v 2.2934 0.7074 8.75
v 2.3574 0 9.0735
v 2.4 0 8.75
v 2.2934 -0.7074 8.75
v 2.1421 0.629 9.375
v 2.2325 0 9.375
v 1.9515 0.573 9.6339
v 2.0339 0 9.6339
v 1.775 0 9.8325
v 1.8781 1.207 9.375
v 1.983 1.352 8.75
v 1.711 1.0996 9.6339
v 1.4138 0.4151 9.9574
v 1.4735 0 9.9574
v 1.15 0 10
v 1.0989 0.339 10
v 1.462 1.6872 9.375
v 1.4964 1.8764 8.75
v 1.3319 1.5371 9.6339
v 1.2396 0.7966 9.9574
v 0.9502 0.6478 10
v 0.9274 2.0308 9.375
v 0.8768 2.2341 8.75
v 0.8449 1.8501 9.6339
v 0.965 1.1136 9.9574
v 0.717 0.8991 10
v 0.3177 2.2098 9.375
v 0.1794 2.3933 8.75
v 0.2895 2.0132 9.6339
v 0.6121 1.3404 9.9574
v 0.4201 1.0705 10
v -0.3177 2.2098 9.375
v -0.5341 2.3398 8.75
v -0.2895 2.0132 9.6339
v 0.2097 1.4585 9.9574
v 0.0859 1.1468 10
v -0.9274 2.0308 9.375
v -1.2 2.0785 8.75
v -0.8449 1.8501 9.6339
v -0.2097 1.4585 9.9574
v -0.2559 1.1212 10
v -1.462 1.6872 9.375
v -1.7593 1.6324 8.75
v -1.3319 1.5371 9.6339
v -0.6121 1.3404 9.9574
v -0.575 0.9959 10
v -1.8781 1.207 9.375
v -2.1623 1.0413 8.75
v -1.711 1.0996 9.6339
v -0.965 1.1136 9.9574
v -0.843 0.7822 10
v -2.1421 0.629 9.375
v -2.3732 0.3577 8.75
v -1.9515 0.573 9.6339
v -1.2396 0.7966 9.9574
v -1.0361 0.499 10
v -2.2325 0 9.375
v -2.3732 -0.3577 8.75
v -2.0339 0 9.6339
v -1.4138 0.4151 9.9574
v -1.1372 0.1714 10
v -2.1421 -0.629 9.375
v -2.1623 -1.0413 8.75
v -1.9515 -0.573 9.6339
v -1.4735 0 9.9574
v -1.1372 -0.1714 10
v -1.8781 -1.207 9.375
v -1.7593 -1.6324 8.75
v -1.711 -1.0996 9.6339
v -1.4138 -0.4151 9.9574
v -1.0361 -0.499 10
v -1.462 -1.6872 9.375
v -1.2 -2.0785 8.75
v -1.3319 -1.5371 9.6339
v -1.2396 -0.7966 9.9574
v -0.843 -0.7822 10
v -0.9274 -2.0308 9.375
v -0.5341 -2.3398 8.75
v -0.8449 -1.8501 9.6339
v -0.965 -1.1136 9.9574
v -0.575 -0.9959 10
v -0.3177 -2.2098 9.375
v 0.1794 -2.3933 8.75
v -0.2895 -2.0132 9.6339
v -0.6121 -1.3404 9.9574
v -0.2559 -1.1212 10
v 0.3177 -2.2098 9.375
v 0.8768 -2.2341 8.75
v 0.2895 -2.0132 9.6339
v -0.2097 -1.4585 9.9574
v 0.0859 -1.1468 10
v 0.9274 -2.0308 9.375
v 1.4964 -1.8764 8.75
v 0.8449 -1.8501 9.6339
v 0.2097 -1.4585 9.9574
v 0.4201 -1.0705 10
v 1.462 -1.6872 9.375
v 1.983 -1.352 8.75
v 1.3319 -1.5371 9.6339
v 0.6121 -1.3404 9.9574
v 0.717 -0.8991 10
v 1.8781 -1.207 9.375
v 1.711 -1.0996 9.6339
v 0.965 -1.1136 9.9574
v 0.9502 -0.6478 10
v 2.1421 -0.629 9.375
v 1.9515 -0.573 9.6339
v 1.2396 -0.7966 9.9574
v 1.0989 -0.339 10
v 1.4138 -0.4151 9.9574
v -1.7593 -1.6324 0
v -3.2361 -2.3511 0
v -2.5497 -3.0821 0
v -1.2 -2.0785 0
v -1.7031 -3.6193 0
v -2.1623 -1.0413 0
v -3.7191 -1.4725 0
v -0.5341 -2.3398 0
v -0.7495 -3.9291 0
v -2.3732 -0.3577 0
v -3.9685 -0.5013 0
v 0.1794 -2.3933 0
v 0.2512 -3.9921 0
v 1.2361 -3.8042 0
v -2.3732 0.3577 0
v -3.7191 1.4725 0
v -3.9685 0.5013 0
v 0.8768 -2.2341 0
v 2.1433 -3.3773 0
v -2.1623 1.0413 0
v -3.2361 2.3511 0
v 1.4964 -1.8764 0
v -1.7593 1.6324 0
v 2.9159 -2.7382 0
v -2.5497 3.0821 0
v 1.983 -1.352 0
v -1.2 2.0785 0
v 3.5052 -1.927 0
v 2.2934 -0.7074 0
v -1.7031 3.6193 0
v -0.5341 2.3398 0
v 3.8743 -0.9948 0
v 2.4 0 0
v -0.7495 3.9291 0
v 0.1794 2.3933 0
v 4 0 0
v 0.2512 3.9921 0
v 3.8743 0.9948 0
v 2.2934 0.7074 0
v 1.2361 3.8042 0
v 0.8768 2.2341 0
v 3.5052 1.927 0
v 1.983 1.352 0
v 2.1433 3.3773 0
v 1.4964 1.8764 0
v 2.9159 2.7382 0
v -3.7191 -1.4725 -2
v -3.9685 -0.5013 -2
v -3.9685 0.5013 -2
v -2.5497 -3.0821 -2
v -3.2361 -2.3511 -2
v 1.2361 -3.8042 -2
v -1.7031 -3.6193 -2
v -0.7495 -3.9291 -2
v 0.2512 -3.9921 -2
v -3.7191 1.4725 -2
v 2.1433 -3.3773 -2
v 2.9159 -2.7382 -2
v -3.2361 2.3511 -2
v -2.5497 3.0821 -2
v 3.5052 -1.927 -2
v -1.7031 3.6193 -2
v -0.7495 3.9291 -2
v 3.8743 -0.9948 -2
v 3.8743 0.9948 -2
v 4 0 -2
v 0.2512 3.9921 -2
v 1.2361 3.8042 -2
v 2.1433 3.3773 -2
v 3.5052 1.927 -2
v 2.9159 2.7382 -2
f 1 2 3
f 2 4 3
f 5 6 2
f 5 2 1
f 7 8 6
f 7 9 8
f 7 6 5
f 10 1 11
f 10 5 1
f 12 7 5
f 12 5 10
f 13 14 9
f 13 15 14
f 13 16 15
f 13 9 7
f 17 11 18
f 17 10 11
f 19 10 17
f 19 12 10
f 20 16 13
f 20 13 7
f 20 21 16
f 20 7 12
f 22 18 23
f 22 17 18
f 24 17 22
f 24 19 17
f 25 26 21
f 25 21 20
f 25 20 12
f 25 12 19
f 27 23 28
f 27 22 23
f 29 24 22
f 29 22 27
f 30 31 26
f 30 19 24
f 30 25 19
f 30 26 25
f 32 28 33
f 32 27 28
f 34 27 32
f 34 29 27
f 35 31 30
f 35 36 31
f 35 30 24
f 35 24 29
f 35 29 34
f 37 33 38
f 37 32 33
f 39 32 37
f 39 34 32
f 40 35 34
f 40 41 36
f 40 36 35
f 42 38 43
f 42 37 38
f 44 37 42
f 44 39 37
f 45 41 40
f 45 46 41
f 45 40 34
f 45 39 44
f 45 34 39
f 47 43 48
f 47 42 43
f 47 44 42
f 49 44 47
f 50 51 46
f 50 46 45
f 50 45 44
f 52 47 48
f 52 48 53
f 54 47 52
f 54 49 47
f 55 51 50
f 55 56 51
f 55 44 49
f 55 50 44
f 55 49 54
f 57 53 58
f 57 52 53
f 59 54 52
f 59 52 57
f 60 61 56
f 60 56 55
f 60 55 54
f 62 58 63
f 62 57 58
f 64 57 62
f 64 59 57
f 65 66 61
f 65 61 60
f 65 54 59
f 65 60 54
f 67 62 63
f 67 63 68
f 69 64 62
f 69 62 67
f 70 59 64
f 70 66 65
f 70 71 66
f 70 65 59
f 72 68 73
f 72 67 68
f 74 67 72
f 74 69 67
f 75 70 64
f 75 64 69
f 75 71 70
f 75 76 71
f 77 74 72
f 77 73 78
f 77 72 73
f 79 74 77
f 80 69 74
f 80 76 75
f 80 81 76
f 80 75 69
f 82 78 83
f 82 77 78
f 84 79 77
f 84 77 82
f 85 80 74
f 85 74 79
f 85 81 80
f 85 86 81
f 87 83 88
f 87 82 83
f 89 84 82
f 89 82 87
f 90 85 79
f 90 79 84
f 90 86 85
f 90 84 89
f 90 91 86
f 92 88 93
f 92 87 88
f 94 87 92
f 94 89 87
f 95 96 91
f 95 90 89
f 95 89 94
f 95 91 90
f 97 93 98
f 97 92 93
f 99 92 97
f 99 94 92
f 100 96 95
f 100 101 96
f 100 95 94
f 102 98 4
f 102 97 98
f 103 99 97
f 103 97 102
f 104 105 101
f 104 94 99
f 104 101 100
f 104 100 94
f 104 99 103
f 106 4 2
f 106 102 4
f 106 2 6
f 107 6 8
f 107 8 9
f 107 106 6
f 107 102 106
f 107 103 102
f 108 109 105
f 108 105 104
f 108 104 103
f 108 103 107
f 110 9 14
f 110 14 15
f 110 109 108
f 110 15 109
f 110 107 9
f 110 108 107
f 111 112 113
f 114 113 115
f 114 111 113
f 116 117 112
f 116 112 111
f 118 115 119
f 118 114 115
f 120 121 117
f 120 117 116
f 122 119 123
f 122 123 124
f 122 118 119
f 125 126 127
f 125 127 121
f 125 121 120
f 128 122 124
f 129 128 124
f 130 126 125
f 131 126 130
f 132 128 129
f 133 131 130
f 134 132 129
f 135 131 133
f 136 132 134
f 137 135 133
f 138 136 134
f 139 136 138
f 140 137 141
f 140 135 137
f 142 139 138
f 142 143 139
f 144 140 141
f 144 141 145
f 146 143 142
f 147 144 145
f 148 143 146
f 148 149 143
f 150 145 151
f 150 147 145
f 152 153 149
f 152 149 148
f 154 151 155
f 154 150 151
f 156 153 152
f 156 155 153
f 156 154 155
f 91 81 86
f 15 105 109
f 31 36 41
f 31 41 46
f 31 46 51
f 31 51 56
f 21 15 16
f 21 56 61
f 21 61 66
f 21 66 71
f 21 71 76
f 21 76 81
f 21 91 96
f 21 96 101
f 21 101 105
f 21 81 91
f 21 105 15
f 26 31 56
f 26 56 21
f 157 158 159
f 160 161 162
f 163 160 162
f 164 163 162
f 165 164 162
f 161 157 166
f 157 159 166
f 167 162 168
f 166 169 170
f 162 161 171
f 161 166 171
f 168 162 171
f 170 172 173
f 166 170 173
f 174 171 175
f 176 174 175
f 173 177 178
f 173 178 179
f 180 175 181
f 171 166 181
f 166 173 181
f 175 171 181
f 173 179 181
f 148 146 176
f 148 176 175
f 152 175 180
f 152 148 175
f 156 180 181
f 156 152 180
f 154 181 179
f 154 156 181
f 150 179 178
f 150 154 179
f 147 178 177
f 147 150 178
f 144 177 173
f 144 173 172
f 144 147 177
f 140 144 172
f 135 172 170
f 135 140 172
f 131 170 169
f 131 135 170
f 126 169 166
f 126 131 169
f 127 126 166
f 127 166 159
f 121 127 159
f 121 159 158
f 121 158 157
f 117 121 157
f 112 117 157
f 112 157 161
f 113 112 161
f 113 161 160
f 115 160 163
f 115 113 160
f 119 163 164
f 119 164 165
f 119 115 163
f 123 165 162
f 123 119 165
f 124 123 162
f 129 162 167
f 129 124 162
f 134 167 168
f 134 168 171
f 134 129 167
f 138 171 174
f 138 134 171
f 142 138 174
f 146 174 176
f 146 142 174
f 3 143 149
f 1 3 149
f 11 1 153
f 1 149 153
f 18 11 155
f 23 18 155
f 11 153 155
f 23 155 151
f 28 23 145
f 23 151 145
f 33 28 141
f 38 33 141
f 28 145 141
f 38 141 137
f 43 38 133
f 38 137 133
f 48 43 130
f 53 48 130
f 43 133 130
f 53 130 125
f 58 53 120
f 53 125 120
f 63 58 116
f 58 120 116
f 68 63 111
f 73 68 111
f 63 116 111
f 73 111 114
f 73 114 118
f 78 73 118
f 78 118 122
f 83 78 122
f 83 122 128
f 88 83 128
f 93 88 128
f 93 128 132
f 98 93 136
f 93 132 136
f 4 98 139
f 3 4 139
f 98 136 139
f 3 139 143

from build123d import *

# Parameters (mm, degrees)
BASE_SKETCH_R      = 4
BASE_EXTRUDE_DEPTH = 2
SKETCH2_R          = 2.4
TOP_EXTRUDE_DEPTH  = 10
TOP_FILLET_R       = 1.25


with BuildPart() as part:
    # Base Sketch → Base Extrude (new body)
    with BuildSketch(Plane.XY):
        Circle(BASE_SKETCH_R)
    extrude(amount=-BASE_EXTRUDE_DEPTH)

    # Sketch2 → Top Extrude (add)
    with BuildSketch(Plane.XY):
        Circle(SKETCH2_R)
    extrude(amount=TOP_EXTRUDE_DEPTH)

    # Top Fillet
    top_fillet_edges = [part.edges().sort_by_distance(p)[0] for p in [
        (-2.4, 0, 10),
    ]]
    fillet(top_fillet_edges, radius=TOP_FILLET_R)


solid = part.part
